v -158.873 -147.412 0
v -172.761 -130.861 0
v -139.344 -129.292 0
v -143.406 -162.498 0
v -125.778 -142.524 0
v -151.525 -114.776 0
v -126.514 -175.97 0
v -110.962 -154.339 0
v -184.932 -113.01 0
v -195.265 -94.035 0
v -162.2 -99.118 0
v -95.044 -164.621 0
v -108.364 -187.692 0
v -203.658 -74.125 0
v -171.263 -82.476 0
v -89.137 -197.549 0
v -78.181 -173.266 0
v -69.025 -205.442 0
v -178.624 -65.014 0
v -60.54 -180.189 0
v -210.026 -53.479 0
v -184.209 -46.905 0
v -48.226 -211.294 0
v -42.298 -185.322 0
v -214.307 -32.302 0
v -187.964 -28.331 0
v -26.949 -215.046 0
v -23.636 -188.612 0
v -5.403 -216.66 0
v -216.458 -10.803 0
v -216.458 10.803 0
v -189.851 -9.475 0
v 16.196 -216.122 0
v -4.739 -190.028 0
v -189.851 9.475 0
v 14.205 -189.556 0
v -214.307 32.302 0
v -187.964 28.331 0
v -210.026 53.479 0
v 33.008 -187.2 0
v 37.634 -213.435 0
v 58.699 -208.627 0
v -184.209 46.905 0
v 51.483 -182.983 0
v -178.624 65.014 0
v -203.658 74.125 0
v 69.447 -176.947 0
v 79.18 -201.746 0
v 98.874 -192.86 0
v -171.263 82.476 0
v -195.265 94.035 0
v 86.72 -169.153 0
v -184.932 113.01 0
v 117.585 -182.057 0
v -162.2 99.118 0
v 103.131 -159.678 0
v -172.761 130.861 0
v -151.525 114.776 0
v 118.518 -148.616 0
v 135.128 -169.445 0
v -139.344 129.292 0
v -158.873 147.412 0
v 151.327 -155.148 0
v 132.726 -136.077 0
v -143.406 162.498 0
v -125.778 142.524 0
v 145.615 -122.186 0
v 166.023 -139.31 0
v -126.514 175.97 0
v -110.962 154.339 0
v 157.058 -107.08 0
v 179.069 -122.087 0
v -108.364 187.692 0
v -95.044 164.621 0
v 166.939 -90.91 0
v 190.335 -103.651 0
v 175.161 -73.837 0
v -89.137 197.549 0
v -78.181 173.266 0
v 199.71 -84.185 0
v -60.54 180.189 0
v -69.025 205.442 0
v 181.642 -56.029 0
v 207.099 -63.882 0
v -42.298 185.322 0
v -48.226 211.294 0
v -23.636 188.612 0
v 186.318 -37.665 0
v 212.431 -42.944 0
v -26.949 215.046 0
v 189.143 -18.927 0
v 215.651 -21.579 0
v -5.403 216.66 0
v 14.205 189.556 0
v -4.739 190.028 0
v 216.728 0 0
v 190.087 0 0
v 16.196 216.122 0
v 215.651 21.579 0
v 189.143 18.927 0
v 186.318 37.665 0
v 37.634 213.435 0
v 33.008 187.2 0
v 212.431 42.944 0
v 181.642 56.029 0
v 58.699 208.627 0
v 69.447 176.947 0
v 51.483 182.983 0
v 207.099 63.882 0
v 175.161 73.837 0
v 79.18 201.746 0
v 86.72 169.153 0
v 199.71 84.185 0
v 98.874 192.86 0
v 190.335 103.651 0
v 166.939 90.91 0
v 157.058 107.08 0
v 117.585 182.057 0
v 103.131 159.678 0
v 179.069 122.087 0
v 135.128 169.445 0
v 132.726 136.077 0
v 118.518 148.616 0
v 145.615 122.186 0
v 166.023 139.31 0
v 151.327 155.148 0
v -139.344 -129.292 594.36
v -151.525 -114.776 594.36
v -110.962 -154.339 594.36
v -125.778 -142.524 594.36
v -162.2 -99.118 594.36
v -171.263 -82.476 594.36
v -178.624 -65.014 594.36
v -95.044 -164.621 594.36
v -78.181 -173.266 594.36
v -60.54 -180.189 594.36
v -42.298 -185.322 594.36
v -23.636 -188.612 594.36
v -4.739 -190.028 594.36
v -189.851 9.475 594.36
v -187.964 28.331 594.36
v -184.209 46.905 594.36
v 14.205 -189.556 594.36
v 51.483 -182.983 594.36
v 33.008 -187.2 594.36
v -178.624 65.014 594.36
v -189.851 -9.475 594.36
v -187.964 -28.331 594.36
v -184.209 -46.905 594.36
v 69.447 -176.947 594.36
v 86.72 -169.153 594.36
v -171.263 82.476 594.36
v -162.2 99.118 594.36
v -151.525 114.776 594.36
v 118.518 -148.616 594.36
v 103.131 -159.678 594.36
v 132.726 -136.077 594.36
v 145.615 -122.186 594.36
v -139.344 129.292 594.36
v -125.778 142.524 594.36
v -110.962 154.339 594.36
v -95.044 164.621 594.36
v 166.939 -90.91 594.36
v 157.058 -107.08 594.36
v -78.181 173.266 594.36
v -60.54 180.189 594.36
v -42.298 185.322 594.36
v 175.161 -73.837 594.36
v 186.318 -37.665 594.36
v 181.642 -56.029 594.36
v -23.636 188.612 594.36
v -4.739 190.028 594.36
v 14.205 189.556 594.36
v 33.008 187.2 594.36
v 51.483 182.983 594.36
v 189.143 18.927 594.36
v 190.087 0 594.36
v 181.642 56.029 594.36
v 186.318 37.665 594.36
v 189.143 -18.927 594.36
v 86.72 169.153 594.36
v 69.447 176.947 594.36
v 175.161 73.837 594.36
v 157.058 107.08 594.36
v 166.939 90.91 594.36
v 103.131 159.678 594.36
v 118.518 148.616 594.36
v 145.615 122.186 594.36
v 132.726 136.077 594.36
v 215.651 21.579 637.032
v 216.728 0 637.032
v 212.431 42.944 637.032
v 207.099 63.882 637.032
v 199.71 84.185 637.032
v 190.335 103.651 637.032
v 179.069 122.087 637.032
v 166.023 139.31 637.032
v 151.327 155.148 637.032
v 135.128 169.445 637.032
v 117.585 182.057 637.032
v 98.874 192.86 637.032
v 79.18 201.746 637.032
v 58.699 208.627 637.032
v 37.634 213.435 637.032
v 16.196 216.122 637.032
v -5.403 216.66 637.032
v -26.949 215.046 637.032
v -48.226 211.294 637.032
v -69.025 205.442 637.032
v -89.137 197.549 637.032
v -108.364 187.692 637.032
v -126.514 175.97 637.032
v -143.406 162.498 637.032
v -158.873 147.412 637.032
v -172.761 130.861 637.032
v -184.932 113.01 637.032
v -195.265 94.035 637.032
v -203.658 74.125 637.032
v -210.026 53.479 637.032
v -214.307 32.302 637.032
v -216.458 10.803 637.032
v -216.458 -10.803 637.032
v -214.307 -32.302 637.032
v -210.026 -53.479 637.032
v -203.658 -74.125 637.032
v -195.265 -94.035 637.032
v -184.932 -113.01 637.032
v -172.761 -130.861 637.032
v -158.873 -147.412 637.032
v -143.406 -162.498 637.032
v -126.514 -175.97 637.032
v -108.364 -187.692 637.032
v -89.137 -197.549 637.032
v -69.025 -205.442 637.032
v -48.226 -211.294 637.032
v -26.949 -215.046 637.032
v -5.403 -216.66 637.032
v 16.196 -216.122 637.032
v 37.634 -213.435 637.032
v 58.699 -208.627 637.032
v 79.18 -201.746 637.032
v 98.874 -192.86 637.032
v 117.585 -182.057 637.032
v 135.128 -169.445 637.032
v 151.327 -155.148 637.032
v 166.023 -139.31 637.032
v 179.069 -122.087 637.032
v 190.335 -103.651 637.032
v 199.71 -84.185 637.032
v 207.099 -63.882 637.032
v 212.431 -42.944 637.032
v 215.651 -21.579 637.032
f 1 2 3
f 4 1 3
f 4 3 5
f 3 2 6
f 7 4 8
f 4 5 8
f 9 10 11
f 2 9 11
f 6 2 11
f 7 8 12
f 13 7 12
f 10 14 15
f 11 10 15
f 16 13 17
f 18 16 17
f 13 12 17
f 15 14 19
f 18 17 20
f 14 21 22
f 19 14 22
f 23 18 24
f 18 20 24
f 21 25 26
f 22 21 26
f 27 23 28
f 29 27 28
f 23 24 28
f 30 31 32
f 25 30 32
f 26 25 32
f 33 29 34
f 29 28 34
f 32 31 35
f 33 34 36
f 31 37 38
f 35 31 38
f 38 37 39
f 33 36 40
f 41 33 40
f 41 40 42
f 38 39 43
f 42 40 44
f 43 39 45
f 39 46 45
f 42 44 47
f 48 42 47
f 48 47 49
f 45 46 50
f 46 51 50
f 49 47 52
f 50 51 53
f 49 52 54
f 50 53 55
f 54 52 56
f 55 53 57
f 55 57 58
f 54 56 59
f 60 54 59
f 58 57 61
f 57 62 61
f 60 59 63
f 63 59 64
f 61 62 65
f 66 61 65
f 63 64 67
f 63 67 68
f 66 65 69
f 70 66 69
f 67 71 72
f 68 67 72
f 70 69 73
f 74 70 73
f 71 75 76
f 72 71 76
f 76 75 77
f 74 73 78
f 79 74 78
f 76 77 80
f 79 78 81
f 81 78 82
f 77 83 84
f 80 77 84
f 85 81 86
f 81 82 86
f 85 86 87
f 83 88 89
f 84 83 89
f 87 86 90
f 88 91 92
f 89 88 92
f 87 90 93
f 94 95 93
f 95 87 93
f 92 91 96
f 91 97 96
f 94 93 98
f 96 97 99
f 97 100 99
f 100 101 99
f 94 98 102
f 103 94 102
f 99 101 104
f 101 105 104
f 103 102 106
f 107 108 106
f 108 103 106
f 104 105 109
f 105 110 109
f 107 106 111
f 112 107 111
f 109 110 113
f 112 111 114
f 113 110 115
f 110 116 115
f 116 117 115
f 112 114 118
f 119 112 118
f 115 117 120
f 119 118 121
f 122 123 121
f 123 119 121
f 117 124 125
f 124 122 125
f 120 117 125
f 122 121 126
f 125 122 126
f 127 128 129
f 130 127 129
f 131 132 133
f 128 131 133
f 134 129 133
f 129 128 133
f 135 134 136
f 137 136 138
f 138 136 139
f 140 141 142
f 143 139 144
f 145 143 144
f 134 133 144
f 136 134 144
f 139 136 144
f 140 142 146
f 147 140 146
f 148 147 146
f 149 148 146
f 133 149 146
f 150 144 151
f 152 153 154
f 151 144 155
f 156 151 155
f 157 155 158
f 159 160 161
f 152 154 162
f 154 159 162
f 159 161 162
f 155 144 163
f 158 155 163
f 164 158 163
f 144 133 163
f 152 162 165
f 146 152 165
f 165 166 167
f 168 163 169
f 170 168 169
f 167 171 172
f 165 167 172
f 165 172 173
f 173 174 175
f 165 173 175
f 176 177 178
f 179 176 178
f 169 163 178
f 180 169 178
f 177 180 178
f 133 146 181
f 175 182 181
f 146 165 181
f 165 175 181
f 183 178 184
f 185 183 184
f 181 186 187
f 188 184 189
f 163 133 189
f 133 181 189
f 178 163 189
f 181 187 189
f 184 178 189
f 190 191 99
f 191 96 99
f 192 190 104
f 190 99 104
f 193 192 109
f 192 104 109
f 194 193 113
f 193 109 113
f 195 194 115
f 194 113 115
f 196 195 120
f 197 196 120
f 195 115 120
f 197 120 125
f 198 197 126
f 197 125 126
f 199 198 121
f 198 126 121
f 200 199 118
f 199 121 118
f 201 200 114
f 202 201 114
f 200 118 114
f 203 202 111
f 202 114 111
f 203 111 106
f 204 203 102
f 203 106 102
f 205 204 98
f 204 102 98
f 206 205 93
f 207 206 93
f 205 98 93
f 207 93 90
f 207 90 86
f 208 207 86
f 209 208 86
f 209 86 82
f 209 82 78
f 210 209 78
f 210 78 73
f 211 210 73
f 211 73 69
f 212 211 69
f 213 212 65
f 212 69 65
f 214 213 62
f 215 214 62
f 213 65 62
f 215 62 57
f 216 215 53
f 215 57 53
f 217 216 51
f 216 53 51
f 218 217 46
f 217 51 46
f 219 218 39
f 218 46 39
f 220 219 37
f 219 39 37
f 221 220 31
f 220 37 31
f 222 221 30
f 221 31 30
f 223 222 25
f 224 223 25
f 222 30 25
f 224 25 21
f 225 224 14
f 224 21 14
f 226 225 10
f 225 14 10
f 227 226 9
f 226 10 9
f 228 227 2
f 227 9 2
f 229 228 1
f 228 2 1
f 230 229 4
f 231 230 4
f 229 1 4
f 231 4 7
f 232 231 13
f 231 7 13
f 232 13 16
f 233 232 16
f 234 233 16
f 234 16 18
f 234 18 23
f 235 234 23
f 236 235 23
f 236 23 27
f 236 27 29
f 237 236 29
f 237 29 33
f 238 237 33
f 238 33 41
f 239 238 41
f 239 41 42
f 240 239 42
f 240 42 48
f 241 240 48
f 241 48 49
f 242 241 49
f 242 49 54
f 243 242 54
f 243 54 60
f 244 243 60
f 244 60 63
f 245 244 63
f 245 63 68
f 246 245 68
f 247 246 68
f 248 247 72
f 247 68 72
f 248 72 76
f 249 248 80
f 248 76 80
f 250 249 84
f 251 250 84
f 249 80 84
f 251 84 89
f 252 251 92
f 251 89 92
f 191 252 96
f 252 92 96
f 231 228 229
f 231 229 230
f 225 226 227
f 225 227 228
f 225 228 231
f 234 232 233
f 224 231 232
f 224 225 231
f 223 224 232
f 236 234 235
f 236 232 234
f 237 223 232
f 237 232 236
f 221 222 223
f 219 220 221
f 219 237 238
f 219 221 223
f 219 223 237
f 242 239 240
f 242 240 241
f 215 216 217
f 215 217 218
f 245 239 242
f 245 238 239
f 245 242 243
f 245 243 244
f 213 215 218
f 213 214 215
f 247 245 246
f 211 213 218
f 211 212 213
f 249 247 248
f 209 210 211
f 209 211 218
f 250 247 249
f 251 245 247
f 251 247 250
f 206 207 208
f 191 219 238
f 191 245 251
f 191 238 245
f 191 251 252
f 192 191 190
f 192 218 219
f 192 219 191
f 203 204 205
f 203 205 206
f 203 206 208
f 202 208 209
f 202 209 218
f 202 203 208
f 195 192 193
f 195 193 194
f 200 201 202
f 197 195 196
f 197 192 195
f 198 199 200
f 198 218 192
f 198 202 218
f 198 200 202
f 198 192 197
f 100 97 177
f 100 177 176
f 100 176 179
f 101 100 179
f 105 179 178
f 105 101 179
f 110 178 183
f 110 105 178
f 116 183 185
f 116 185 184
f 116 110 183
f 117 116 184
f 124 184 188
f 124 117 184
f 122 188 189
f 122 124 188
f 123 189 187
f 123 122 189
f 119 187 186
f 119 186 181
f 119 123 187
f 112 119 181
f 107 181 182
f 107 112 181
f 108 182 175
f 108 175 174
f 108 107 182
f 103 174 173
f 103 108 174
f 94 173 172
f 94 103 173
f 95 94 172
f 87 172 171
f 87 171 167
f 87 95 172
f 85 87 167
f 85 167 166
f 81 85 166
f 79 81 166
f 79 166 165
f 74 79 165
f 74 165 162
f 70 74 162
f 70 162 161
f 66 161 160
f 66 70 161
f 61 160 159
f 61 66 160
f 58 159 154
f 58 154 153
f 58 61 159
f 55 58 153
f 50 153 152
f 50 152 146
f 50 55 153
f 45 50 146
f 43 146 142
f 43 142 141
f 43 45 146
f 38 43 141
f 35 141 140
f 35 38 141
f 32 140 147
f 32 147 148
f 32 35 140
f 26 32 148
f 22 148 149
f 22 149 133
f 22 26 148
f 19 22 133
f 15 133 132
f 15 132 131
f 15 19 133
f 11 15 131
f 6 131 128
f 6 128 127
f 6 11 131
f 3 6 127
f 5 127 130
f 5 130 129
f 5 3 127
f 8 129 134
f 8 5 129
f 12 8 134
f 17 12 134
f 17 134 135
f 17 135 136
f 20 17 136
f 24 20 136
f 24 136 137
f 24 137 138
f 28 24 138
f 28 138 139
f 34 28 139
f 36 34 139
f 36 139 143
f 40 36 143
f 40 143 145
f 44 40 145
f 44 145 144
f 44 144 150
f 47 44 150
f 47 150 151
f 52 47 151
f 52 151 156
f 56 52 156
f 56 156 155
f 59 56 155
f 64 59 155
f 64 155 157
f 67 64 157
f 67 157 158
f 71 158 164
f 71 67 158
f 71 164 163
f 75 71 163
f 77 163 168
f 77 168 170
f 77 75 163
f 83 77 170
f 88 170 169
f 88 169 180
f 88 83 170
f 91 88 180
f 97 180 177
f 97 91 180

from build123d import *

# Parameters (mm, degrees)
F0_R      = 216.727836
F1_DEPTH  = 116.332
F1_FACE_R = 216.727836
F3_DEPTH  = 520.7
F2_R      = 190.087444
F4_DEPTH  = 594.36


with BuildPart() as f1:
    # F0 (on Top) → F1 (new body)
    with BuildSketch(Plane.XY):
        Circle(F0_R)
    extrude(amount=F1_DEPTH)

    # F1_face (on face) → F3 (join)
    with BuildSketch(Plane.XY.offset(116.332)):
        Circle(F1_FACE_R)
    extrude(amount=F3_DEPTH)

    # F2 (on Top) → F4 (cut)
    with BuildSketch(Plane.XY):
        Circle(F2_R)
    extrude(amount=F4_DEPTH, mode=Mode.SUBTRACT)


solid = f1.part
